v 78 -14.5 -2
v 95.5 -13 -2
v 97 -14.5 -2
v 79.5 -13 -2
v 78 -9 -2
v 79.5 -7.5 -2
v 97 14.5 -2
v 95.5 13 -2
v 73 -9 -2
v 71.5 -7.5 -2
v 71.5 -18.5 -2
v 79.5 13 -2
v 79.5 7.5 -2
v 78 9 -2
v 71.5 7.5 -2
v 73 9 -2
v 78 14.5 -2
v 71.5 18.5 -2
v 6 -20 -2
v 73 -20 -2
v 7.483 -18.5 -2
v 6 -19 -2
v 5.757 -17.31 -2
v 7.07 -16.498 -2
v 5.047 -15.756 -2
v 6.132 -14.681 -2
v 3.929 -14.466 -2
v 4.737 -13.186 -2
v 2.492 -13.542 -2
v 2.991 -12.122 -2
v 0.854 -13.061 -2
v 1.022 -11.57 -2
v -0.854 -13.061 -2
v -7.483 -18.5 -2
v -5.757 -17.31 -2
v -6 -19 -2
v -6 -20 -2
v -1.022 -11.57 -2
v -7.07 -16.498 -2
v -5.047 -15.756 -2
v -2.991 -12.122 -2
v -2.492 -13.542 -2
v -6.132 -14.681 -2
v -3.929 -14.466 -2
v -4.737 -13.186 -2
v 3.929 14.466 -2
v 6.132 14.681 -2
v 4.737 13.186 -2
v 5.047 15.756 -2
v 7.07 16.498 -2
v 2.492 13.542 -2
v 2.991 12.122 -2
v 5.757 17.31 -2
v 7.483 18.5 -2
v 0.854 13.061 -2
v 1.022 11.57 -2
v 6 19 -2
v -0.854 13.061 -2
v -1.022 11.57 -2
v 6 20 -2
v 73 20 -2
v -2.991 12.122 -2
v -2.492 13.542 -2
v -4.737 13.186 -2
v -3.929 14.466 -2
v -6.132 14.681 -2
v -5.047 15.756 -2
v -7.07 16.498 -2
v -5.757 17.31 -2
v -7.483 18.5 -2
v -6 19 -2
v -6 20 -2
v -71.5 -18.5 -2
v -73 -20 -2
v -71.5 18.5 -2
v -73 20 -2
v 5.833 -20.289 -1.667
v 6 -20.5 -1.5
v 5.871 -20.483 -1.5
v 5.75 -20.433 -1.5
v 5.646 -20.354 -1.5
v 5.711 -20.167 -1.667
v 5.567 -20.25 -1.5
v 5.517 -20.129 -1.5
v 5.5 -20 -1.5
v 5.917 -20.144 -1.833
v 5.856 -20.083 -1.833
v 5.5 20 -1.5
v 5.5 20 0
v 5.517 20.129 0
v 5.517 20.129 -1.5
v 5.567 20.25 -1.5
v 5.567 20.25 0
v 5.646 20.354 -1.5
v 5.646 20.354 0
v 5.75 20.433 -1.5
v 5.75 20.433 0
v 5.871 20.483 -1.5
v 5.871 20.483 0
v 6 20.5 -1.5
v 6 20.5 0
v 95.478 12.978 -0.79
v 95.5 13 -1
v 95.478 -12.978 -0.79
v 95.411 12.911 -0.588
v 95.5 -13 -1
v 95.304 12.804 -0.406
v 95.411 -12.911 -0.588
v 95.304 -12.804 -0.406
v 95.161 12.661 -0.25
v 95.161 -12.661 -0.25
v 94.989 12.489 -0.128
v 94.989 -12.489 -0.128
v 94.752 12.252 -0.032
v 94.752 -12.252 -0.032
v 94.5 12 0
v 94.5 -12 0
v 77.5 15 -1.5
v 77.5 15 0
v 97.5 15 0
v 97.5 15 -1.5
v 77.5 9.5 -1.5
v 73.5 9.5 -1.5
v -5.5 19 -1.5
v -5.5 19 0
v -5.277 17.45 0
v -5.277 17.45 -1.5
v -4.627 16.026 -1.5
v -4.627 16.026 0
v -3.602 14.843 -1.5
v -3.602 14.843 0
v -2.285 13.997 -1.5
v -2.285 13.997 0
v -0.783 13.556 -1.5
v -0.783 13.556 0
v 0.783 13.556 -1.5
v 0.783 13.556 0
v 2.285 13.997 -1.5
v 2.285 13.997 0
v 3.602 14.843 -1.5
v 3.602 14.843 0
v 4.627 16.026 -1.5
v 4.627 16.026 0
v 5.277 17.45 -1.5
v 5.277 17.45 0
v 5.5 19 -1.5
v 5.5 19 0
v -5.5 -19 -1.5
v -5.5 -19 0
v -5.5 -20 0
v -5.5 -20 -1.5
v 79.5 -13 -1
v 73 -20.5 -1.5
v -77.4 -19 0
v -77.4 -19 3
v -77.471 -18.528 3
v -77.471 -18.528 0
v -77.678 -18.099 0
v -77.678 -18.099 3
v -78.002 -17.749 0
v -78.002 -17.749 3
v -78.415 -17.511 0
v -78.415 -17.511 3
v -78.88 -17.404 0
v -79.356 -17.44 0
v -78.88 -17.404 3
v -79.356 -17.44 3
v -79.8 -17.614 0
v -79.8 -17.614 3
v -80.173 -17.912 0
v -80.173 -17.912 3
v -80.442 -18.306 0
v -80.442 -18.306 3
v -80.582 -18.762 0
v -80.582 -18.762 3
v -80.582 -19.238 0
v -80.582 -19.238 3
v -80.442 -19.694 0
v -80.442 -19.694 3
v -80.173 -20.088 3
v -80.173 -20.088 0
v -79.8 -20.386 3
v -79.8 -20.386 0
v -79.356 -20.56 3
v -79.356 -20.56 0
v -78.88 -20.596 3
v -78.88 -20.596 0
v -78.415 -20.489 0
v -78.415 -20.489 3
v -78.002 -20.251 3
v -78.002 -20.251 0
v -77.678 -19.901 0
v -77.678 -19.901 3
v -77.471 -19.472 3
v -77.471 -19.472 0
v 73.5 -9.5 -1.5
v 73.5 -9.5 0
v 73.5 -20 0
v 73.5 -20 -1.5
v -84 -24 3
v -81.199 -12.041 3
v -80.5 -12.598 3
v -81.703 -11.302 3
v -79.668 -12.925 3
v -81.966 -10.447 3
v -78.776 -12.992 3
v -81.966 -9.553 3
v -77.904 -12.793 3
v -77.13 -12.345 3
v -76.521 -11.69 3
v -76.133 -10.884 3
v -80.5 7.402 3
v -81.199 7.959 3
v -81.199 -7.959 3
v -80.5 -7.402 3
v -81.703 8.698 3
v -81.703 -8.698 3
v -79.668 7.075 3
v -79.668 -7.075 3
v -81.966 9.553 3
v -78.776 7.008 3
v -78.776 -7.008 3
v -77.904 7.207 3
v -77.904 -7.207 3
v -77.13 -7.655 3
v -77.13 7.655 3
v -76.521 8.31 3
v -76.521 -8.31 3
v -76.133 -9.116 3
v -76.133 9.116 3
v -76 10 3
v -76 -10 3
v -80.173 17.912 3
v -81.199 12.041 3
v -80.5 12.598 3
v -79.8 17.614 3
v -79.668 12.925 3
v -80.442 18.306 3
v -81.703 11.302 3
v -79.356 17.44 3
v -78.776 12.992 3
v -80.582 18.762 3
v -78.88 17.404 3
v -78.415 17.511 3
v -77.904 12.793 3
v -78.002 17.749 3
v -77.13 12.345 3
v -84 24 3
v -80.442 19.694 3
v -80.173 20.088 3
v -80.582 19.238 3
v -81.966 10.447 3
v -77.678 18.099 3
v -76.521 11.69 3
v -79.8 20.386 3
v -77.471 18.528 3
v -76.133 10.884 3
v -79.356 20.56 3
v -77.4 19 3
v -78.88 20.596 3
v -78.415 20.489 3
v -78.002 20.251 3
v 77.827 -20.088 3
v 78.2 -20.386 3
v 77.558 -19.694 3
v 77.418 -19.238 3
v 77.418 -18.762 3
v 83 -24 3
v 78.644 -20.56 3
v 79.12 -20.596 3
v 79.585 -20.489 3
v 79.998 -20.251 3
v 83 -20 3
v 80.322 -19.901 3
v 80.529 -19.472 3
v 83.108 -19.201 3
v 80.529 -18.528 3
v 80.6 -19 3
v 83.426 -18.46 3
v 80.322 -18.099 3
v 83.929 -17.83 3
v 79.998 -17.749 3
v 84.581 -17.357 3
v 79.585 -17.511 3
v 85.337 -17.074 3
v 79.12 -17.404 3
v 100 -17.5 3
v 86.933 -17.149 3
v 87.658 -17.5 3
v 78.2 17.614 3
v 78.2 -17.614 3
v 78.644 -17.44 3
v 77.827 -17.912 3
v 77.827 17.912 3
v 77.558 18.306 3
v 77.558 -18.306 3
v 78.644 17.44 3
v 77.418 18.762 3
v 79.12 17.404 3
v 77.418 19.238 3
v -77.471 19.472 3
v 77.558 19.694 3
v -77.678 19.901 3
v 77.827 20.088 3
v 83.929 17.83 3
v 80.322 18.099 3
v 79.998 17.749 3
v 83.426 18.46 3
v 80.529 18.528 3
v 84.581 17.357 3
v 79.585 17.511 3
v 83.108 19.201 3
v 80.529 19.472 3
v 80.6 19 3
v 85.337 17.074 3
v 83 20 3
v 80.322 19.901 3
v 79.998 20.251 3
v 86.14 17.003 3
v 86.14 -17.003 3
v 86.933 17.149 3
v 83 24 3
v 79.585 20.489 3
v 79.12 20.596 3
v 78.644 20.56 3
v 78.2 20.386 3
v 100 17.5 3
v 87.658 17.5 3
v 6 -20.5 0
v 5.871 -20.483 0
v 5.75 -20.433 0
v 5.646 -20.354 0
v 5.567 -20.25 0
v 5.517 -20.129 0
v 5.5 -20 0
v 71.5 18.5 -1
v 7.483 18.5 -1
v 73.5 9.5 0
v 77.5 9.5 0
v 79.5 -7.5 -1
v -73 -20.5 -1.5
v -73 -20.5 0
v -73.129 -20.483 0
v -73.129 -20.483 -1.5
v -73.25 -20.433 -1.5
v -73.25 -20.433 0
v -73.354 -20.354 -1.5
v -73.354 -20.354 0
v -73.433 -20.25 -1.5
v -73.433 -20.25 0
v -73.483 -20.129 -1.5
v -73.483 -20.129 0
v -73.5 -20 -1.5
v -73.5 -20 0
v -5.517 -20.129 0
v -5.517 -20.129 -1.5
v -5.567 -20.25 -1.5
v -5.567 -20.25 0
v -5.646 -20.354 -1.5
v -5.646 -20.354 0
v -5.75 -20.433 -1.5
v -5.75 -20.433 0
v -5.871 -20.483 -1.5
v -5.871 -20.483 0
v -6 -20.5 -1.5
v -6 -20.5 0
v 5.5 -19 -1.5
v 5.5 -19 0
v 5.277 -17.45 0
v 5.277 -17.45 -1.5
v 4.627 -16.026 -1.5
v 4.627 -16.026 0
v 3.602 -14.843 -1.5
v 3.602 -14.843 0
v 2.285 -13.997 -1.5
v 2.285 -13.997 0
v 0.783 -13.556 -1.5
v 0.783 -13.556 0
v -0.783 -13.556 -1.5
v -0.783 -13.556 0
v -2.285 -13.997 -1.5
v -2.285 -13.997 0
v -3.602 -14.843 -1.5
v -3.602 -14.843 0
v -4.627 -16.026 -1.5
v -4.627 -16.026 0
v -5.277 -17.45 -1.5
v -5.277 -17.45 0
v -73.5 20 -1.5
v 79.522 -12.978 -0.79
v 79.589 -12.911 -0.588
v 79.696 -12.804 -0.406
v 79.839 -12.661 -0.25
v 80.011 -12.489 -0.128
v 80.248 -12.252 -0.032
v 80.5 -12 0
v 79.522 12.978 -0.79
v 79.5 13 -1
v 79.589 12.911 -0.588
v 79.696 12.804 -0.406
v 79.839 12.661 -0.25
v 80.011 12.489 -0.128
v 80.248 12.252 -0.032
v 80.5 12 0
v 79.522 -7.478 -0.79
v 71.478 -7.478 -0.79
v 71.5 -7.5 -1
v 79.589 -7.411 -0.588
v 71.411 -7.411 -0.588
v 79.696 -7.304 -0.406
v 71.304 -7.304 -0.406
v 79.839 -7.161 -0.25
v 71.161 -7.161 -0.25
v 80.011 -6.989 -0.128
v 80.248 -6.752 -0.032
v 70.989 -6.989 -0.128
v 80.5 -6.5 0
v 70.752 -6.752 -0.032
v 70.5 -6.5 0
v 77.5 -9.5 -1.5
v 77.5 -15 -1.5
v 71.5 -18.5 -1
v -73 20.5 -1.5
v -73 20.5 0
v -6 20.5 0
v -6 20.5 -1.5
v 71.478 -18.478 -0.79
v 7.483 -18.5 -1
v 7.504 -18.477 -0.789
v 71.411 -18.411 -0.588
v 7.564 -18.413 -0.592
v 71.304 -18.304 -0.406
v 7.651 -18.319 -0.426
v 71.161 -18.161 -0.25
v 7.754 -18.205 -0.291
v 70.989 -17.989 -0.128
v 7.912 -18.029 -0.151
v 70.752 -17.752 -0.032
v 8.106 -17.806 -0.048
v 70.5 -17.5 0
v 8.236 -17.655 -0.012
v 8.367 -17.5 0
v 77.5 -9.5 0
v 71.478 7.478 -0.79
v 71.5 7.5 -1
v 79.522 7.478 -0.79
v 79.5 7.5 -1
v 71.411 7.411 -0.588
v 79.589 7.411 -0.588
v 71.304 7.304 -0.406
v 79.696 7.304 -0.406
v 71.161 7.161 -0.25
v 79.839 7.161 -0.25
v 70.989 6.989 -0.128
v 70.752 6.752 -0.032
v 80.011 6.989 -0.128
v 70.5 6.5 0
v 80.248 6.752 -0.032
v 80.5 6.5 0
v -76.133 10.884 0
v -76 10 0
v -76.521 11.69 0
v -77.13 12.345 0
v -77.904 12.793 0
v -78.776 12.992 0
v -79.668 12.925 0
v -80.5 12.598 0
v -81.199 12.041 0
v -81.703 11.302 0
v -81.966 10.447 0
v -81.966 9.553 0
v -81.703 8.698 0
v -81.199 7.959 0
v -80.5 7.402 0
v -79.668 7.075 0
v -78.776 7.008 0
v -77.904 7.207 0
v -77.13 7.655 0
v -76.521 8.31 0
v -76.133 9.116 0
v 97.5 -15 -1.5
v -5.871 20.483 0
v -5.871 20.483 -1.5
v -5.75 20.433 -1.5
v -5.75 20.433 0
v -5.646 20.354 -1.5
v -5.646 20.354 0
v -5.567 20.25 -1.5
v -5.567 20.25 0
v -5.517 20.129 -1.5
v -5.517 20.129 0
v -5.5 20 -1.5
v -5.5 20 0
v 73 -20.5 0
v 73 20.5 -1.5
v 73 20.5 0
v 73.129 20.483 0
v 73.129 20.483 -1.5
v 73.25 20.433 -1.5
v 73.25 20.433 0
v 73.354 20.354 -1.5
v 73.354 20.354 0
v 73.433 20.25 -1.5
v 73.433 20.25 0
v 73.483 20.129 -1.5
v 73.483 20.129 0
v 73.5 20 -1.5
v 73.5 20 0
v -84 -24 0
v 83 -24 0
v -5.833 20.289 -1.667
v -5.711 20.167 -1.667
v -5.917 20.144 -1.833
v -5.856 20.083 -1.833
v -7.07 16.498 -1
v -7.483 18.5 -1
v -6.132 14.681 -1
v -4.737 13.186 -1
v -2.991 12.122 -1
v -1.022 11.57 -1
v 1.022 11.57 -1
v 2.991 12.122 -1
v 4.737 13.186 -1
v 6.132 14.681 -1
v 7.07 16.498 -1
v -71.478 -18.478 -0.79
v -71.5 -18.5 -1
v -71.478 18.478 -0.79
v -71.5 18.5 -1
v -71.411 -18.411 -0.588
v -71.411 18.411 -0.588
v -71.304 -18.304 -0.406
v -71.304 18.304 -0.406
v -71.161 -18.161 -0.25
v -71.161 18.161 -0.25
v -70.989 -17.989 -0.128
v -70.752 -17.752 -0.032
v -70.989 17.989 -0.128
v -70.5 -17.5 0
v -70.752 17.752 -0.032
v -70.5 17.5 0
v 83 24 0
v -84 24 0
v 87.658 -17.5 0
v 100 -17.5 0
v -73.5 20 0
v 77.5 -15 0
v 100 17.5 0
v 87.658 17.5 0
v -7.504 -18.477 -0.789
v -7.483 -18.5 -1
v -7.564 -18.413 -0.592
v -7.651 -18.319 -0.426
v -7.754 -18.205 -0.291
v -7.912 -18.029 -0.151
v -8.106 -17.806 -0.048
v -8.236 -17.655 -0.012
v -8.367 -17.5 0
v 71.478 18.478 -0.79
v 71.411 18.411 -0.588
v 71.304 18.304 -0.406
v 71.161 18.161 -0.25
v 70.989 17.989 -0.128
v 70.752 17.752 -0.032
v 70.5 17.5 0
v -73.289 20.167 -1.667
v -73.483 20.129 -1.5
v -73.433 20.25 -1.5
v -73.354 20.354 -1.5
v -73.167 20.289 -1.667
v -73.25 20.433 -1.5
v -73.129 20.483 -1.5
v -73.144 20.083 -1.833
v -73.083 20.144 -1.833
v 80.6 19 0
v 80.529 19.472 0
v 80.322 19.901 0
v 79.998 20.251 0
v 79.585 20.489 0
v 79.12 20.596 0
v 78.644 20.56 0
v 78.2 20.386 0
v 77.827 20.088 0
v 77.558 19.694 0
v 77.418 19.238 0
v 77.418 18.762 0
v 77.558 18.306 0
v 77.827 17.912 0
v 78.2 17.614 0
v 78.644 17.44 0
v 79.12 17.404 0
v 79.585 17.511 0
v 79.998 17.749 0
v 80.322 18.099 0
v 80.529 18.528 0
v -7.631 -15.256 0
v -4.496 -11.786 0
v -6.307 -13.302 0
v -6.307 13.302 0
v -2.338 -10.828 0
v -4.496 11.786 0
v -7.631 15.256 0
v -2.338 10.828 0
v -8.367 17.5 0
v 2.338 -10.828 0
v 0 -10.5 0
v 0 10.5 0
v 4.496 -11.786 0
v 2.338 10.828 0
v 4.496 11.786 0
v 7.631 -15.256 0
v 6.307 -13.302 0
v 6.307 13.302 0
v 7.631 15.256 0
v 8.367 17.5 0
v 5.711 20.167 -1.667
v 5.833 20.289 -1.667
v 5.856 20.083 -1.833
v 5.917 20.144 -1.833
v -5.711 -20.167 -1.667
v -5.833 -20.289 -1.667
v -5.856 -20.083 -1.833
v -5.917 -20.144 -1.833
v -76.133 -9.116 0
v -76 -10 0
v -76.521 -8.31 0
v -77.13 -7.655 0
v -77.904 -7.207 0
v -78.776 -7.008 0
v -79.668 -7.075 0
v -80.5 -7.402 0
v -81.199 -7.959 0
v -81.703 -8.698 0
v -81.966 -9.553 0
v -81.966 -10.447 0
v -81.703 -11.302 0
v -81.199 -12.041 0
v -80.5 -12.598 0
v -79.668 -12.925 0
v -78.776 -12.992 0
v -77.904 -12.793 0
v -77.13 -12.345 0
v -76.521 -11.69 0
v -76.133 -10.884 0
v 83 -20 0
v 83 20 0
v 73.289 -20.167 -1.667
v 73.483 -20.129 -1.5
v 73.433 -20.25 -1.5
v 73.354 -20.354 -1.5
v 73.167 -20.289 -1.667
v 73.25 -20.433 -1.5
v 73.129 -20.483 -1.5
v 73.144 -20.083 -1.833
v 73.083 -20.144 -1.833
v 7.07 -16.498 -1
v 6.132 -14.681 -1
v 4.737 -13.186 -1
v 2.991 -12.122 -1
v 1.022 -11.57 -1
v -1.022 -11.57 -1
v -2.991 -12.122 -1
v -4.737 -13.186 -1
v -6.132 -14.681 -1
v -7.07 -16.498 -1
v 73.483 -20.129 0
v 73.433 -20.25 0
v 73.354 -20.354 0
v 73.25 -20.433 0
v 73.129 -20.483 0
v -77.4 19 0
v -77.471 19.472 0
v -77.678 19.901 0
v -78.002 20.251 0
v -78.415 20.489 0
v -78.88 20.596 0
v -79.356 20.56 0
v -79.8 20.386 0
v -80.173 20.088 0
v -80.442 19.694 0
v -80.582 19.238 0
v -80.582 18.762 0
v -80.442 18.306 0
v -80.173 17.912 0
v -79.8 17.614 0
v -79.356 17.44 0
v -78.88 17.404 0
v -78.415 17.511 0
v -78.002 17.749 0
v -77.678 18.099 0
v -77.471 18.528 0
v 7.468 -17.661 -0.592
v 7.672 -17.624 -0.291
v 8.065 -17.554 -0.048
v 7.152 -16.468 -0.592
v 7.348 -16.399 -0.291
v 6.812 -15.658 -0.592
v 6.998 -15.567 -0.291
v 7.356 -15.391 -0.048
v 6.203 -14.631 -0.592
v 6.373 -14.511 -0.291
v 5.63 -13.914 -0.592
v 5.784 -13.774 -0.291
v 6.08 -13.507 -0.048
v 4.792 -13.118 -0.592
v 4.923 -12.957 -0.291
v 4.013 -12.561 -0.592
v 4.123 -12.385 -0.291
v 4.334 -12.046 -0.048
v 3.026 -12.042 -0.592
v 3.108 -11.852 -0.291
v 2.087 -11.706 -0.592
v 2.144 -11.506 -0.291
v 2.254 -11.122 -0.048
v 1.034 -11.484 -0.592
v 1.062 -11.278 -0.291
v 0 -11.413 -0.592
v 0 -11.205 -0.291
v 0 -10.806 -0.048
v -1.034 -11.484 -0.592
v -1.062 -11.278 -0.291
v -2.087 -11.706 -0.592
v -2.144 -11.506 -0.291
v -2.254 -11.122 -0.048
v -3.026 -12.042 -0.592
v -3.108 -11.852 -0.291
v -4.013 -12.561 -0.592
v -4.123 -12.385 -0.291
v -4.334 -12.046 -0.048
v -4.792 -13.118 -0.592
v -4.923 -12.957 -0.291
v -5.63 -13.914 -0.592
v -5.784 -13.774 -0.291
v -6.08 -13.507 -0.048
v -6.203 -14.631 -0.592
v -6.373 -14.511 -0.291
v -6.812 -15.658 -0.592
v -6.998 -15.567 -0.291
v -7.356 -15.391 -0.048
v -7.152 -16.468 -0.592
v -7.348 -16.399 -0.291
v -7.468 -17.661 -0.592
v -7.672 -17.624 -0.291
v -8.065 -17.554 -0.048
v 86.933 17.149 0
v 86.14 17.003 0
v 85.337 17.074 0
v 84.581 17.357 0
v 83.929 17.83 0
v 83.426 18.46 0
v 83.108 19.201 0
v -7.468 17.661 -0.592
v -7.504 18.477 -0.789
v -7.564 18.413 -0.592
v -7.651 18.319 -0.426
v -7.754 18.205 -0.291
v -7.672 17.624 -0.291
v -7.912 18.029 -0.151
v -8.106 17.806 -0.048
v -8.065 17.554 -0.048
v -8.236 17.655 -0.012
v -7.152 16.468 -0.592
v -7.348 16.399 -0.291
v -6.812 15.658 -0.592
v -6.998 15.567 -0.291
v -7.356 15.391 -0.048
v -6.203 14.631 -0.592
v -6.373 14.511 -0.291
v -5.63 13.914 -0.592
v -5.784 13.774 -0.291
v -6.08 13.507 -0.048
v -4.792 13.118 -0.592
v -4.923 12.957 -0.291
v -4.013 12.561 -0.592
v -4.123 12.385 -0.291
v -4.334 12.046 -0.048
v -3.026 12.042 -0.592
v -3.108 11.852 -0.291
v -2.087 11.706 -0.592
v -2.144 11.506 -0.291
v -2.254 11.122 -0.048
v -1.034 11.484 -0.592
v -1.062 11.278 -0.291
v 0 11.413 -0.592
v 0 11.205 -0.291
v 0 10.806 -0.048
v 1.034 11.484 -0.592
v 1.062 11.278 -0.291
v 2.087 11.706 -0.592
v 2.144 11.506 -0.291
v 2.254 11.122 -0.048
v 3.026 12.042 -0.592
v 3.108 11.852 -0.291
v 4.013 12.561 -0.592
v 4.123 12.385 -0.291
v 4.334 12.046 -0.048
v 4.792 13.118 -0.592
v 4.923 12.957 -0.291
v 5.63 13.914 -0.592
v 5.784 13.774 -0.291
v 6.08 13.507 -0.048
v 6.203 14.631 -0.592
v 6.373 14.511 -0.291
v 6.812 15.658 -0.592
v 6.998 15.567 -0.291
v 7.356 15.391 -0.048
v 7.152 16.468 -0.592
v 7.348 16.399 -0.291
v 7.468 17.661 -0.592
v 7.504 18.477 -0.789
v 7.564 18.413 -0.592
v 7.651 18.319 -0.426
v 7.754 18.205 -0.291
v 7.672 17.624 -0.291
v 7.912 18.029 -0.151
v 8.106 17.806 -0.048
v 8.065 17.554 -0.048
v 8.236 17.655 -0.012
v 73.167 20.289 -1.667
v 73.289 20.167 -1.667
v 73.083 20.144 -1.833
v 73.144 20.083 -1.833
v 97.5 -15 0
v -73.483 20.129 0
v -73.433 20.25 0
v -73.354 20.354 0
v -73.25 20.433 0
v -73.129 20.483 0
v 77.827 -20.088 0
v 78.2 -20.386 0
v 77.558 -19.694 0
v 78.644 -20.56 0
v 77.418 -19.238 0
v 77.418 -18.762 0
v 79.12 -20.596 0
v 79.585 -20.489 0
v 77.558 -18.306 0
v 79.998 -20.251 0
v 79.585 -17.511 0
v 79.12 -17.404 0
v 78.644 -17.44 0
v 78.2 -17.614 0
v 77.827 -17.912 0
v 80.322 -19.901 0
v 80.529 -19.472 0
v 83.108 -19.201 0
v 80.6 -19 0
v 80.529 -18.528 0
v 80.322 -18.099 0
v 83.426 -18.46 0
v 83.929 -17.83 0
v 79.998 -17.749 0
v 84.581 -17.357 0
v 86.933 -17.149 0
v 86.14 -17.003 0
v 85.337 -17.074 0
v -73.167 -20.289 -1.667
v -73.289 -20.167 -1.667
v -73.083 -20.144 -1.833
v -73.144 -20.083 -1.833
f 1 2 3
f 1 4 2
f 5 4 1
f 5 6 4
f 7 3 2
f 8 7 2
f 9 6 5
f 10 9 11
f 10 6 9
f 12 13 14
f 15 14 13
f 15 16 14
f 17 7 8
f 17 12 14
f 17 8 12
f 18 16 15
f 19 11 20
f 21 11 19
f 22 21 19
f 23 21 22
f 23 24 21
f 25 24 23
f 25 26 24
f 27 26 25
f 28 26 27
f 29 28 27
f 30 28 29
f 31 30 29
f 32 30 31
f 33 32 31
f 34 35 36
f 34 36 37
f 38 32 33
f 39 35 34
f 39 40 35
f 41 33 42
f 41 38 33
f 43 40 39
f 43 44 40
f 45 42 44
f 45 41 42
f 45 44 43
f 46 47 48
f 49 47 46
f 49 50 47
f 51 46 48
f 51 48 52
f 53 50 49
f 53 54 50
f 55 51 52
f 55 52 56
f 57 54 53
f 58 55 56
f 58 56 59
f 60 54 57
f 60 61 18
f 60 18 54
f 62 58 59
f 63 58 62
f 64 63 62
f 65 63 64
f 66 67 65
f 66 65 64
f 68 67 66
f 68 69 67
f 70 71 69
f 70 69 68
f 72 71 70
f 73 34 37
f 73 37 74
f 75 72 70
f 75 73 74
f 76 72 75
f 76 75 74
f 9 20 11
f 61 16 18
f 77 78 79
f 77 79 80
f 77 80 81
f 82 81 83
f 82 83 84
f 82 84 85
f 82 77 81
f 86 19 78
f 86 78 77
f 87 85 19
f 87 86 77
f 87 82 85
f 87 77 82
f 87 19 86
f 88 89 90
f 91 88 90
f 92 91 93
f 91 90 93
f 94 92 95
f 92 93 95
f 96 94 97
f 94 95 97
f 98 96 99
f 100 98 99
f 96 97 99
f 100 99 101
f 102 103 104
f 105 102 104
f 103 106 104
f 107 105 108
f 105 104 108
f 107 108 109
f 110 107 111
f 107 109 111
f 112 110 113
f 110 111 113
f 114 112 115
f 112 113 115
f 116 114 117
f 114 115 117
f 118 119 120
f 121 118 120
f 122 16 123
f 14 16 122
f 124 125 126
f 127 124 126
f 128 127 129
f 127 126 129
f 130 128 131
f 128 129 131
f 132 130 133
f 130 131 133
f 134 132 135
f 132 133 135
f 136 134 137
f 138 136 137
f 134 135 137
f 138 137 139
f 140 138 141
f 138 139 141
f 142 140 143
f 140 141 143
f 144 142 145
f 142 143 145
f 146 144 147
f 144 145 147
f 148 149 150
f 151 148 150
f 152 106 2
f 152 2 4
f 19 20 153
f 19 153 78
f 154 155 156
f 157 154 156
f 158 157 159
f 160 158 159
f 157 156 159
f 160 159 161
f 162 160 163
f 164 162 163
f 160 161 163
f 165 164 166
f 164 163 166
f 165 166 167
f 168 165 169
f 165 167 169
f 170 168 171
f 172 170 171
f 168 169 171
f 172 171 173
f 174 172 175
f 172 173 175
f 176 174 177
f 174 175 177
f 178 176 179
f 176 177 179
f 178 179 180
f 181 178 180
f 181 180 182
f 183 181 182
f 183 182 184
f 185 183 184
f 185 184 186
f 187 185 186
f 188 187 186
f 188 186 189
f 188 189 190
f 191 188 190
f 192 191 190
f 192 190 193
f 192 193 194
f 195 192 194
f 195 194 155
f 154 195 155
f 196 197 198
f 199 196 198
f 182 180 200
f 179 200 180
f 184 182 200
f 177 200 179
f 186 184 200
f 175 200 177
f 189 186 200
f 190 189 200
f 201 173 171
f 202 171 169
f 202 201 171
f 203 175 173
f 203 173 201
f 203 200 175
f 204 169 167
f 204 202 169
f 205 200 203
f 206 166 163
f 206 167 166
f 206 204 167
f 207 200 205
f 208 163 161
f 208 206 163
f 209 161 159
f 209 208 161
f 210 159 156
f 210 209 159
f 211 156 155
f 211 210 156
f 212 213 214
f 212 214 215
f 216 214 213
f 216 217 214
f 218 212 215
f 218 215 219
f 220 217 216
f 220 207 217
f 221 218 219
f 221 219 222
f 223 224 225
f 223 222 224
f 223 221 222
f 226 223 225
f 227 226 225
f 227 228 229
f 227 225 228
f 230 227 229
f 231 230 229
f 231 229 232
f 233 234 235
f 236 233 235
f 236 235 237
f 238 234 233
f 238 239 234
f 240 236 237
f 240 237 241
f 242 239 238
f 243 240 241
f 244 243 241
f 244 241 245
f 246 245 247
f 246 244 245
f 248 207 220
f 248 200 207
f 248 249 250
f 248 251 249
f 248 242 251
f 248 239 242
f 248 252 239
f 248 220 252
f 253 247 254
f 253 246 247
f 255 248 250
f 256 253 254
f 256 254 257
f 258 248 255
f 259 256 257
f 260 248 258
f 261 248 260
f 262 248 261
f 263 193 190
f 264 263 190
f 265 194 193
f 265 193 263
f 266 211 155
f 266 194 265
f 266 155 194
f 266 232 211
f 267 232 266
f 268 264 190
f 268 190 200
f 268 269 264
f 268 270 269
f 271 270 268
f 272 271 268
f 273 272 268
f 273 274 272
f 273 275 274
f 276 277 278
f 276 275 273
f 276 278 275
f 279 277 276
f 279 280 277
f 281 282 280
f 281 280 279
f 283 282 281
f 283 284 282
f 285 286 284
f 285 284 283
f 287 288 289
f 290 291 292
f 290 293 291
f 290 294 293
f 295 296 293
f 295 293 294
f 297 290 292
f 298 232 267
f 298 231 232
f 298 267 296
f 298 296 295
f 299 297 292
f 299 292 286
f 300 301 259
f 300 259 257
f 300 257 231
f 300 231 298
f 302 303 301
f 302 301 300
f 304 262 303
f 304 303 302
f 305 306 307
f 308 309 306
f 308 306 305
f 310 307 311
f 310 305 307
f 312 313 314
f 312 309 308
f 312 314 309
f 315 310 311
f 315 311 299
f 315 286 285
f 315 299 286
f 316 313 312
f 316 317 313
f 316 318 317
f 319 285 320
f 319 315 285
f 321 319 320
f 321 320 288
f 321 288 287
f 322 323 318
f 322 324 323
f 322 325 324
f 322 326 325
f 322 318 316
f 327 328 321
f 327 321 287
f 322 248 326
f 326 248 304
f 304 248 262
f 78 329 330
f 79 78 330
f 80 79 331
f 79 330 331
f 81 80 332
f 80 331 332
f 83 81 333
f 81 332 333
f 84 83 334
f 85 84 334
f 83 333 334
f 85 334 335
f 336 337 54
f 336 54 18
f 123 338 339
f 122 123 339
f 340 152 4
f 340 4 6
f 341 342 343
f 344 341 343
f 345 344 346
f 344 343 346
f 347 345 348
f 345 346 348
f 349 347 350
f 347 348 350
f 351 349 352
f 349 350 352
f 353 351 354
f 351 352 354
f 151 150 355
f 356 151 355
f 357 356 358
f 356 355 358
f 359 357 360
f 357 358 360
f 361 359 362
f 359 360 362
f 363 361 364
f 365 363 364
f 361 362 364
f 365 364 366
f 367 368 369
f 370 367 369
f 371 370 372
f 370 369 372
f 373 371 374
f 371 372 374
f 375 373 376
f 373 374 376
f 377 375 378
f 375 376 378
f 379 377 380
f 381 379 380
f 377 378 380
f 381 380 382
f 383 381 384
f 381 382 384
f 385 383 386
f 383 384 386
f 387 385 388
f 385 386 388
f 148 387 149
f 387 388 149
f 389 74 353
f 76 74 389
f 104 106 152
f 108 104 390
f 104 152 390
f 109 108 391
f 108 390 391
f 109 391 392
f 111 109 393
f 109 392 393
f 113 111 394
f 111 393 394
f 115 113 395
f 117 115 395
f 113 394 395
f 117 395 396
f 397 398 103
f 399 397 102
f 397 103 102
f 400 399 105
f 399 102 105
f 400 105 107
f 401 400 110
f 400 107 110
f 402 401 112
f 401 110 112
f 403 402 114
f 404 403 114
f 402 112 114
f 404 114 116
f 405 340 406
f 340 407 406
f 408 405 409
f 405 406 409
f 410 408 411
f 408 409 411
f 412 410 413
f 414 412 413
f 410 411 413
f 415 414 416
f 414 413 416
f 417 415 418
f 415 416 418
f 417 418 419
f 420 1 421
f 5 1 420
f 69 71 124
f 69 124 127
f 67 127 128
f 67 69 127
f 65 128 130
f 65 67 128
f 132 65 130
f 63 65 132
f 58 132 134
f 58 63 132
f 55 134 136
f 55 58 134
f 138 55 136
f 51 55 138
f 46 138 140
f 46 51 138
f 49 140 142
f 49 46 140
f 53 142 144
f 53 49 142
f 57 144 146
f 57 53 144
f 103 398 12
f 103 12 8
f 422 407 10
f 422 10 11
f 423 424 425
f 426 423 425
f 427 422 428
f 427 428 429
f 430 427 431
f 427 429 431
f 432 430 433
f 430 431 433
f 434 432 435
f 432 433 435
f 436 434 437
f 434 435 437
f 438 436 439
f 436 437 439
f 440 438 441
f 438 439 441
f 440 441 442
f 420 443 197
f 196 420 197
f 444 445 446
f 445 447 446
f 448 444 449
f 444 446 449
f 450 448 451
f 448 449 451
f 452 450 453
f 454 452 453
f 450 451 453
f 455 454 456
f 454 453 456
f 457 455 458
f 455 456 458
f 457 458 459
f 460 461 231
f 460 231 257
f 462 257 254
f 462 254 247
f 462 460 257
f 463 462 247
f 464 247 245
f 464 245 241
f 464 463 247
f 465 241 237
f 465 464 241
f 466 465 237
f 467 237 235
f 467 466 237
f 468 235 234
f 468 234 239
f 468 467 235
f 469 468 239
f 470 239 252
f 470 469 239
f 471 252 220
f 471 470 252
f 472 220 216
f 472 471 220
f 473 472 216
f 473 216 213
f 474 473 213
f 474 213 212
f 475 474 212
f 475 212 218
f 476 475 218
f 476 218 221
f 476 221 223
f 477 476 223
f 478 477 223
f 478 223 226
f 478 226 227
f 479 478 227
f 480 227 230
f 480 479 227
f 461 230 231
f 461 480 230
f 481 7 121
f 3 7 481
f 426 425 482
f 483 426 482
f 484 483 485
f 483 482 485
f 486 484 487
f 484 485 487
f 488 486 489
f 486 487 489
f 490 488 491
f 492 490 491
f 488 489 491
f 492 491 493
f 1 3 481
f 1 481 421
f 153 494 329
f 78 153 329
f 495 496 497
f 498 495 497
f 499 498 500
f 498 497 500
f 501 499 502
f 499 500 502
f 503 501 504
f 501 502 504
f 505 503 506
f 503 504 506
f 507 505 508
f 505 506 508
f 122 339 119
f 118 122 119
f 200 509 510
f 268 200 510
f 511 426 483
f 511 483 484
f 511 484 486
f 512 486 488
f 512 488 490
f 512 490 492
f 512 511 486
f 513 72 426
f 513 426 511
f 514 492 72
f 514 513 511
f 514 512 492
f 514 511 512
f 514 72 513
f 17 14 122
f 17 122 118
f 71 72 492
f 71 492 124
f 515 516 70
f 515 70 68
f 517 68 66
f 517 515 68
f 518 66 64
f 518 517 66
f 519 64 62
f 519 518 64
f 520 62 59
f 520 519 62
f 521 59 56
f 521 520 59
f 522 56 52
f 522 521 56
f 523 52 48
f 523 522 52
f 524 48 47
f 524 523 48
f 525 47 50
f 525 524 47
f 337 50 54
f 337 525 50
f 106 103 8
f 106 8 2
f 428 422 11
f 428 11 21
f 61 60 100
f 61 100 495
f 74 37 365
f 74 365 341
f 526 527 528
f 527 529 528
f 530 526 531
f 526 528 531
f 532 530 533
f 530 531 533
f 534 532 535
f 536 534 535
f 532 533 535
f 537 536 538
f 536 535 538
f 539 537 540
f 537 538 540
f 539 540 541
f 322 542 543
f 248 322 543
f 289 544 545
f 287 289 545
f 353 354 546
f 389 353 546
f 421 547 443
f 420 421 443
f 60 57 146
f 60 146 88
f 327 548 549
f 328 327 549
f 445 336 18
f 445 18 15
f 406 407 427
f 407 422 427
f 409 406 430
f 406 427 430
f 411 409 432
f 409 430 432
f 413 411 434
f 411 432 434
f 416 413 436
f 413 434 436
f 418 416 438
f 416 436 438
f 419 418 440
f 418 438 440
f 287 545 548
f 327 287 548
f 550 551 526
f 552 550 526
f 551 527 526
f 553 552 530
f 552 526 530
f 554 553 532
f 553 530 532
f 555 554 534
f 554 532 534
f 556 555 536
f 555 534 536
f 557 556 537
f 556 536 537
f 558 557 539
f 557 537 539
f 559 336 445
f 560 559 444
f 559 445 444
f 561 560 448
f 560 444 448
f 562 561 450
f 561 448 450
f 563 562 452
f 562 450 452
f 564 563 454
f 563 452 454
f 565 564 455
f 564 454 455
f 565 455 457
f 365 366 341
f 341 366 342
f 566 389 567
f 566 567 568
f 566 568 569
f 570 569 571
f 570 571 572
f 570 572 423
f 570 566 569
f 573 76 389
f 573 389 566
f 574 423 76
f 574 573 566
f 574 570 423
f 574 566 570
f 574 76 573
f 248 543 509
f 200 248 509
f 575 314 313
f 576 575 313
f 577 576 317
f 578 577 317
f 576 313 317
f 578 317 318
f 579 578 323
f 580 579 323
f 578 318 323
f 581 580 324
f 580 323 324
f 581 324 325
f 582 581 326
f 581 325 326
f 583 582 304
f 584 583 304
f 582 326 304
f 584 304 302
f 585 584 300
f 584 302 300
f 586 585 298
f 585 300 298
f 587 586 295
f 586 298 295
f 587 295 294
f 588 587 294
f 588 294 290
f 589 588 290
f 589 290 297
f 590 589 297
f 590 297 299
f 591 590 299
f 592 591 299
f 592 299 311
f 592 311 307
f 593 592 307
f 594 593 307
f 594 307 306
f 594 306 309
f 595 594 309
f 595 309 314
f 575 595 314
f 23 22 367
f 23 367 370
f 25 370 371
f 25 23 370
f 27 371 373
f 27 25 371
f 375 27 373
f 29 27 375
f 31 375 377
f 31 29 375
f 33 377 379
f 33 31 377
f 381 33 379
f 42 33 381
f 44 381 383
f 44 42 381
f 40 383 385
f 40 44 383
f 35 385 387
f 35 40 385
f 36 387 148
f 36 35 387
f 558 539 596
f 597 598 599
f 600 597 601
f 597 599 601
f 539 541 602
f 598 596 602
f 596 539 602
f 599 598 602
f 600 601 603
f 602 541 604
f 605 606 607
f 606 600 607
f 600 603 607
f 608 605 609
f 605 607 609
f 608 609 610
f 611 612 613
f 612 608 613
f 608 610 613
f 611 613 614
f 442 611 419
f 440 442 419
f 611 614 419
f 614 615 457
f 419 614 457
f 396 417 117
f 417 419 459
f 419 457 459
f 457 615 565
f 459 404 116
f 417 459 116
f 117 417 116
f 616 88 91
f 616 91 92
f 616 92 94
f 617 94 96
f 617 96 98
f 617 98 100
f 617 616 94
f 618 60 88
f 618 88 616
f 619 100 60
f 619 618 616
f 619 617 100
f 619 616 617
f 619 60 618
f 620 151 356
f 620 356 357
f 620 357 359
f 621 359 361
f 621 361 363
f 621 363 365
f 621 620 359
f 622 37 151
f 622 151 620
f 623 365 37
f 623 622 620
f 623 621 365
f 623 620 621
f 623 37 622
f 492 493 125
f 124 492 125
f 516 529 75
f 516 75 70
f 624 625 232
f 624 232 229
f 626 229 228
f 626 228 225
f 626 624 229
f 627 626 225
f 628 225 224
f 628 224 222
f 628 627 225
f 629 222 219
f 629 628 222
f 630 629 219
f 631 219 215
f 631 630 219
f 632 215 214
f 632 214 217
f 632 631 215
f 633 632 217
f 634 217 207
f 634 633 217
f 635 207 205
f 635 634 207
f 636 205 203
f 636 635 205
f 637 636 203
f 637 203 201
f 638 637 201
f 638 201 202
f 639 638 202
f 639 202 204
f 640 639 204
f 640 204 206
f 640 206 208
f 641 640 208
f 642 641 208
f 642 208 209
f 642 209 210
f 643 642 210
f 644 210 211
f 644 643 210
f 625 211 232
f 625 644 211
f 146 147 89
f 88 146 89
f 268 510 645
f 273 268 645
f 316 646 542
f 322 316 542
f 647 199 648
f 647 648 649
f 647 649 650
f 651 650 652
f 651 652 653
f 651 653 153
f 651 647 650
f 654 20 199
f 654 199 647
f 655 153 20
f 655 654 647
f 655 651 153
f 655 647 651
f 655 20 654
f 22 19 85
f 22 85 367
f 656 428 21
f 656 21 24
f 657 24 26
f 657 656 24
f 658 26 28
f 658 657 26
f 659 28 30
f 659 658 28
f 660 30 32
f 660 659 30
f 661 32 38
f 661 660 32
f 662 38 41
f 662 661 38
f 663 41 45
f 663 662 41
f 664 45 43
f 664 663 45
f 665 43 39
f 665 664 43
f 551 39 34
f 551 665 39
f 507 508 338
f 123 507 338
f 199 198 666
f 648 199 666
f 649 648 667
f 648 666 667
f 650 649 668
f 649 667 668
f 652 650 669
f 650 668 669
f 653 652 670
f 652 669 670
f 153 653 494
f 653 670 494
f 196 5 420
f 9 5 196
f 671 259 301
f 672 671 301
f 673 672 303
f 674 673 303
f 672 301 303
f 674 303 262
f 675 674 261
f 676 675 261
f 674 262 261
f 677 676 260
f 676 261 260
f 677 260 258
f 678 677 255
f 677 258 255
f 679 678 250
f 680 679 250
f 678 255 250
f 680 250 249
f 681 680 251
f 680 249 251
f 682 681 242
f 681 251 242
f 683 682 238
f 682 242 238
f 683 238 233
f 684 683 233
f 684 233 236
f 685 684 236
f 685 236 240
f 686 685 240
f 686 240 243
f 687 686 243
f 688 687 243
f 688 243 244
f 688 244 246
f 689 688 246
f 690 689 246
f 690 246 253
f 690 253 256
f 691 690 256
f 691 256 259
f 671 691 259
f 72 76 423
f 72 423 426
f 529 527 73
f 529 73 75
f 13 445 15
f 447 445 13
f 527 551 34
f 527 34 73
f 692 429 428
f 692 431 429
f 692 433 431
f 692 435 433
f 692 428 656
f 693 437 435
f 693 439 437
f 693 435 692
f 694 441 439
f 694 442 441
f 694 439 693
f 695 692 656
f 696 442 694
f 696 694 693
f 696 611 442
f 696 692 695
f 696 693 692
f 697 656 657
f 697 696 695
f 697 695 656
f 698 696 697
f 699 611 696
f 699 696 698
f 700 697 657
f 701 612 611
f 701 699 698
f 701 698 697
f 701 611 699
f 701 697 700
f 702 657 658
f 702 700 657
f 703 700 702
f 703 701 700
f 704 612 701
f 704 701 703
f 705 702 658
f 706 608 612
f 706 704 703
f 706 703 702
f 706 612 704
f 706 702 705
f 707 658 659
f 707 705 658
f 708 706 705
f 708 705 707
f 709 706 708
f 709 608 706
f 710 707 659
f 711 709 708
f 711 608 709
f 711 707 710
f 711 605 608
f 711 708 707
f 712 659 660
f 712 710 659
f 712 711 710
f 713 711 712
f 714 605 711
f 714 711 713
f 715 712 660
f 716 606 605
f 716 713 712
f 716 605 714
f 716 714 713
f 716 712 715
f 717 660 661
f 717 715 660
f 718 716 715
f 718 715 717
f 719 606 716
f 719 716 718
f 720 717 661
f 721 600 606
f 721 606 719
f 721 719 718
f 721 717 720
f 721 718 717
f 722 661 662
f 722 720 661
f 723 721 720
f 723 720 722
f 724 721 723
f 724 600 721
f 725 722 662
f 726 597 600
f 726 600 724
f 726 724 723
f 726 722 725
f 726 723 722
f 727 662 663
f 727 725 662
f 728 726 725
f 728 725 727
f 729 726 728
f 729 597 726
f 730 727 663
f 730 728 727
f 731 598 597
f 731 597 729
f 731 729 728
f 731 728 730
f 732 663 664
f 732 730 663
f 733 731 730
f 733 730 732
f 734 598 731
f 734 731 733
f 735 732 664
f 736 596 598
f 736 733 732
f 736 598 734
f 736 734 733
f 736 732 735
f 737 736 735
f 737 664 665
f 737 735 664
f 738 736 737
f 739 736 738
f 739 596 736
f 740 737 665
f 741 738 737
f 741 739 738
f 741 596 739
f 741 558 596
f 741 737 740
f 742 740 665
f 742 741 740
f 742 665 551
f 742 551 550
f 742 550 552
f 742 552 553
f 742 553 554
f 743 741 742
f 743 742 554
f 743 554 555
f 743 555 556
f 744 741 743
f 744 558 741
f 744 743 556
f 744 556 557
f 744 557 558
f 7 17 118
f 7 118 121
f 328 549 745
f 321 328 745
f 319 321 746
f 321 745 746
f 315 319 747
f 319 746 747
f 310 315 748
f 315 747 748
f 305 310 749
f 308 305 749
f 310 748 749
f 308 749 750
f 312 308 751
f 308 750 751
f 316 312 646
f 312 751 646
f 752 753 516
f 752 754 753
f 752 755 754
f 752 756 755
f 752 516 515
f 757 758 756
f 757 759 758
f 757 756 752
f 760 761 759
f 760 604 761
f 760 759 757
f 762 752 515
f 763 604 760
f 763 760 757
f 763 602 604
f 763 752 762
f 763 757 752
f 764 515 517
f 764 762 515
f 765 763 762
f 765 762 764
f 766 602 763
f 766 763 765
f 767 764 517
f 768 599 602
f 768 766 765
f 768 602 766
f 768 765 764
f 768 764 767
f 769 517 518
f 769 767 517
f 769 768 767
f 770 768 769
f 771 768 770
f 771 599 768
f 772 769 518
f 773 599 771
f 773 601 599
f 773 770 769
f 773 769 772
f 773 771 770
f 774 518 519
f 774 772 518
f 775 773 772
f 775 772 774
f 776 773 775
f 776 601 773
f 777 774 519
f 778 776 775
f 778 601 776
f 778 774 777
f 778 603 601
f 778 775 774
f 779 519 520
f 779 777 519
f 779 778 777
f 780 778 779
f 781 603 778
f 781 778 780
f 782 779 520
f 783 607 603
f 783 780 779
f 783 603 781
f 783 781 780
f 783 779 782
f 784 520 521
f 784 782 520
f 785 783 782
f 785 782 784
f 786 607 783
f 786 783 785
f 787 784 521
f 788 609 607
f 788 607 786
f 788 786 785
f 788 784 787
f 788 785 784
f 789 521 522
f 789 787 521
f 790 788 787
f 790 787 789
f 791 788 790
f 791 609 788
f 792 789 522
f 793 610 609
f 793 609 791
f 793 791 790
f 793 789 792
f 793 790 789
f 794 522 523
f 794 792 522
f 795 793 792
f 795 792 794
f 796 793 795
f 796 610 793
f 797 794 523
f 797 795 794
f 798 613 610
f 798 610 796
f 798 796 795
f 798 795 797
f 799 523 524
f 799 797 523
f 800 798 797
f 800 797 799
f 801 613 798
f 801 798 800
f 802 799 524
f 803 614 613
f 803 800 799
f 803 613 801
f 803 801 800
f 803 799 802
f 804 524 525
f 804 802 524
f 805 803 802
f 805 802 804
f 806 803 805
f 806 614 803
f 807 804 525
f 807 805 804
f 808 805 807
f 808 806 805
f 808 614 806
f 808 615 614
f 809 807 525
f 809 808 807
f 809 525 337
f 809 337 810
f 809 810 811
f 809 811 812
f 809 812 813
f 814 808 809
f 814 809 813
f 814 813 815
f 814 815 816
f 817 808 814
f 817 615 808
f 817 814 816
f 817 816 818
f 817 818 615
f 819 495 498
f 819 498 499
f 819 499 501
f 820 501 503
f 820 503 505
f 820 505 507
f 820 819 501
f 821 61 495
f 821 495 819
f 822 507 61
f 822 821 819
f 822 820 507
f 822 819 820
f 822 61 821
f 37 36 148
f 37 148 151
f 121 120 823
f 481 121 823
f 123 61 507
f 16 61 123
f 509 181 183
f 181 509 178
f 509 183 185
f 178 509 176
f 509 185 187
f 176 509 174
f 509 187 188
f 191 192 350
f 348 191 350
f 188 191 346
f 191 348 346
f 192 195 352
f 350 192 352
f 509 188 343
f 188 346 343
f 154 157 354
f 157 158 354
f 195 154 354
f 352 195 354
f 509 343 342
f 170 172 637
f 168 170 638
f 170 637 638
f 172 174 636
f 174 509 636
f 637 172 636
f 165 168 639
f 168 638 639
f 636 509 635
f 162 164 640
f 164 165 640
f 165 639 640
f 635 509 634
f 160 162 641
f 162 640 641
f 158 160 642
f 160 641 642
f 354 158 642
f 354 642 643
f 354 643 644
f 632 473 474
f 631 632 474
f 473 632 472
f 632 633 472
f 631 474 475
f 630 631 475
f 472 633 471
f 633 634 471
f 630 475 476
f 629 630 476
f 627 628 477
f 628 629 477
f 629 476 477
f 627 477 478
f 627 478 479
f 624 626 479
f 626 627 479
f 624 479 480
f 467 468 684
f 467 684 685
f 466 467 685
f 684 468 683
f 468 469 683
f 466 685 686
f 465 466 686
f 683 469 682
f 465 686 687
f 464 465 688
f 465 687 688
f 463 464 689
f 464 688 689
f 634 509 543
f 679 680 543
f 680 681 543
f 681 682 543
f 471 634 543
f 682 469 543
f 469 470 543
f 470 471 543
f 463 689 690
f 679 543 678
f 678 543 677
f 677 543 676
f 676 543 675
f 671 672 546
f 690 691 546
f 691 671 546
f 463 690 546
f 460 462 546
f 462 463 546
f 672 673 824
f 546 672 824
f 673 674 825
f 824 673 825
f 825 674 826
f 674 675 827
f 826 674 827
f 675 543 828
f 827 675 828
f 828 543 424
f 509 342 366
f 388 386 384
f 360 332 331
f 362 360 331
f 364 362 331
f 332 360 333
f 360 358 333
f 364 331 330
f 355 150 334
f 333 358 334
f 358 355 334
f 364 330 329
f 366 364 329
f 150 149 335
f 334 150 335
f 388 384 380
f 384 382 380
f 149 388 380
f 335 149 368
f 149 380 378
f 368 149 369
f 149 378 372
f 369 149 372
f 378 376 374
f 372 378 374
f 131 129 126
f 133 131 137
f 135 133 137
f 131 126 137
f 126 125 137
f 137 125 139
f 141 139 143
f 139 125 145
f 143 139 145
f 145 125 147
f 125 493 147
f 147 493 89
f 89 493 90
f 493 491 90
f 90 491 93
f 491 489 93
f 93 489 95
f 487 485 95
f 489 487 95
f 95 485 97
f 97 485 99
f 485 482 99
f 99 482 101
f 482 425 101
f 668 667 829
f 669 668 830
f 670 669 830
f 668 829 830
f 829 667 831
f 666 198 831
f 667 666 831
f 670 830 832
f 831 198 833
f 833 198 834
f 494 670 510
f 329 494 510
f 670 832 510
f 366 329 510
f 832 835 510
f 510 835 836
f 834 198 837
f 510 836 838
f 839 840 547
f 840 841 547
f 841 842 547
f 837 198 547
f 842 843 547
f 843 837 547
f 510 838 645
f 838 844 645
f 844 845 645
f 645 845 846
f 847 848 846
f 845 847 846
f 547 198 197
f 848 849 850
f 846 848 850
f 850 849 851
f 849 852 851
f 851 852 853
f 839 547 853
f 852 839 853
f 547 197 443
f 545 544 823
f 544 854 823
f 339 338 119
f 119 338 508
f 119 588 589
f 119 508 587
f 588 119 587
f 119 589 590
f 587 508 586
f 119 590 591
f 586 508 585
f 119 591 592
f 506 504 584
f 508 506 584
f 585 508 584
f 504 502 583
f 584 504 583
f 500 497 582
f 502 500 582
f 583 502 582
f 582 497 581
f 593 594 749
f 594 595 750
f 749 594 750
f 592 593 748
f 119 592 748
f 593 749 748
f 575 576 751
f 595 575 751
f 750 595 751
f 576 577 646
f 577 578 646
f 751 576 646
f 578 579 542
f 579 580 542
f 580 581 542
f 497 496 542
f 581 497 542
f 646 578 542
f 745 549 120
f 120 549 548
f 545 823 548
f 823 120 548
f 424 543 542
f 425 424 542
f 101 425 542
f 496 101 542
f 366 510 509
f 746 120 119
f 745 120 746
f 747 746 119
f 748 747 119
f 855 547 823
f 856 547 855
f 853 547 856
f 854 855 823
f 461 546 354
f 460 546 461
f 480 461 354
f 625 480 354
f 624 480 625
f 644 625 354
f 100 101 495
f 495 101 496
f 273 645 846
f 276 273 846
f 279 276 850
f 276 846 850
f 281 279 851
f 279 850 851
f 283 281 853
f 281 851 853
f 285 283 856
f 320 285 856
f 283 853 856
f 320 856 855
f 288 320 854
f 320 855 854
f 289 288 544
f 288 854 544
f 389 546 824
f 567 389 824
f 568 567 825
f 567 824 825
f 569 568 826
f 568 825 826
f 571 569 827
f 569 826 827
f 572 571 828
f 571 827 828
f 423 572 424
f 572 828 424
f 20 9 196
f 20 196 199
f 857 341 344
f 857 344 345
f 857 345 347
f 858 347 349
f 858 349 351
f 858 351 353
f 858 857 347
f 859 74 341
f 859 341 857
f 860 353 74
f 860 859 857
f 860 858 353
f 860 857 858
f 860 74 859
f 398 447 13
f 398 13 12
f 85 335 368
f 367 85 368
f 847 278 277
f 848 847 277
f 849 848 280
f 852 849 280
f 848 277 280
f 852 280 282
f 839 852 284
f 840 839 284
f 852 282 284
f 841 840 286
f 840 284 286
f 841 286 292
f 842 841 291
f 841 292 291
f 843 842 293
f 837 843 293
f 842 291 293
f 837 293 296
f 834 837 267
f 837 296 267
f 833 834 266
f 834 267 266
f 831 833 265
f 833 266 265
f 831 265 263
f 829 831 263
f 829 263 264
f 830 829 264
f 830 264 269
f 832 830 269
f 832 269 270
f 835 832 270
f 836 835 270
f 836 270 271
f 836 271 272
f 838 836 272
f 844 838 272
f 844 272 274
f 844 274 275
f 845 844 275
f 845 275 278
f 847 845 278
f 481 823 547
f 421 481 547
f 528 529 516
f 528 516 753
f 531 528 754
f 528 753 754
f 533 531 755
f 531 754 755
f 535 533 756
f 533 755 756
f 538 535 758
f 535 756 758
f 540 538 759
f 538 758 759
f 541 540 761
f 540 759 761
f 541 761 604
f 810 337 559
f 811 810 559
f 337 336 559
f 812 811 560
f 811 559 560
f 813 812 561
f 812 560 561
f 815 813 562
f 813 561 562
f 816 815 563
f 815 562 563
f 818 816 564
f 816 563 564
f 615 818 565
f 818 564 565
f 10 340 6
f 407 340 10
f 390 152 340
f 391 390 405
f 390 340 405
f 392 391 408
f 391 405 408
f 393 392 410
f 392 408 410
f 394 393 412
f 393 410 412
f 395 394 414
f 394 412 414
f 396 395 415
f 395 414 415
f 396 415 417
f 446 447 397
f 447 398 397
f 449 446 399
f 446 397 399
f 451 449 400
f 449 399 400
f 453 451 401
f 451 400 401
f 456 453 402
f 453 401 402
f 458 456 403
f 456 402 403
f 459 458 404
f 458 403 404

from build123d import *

# Parameters (mm, degrees)
SKETCH1_R           = 3
BOSS_EXTRUDE1_DEPTH = 3
BOSS_EXTRUDE2_DEPTH = 2
CHAMFER1_SIZE       = 0.5
FILLET1_R           = 1
SKETCH3_R           = 1.6
CUT_EXTRUDE1_DEPTH  = 103.961157725


with BuildPart() as part:
    # Sketch1 → Boss-Extrude1 (new body)
    with BuildSketch(Plane.XY):
        with BuildLine():
            Line((87.658312395, -17.5), (100, -17.5))
            Line((100, -17.5), (100, 17.5))
            Line((100, 17.5), (87.658312395, 17.5))
            ThreePointArc((87.658312395, 17.5), (84.581362835, 17.356617963), (83, 20))
            Line((83, 20), (83, 24))
            Line((83, 24), (-84, 24))
            Line((-84, 24), (-84, -24))
            Line((-84, -24), (83, -24))
            Line((83, -24), (83, -20))
            ThreePointArc((83, -20), (84.581362835, -17.356617963), (87.658312395, -17.5))
        make_face()
        with Locations((-79, -10)):
            Circle(SKETCH1_R, mode=Mode.SUBTRACT)
        with Locations((-79, 10)):
            Circle(SKETCH1_R, mode=Mode.SUBTRACT)
    extrude(amount=BOSS_EXTRUDE1_DEPTH)

    # Sketch2 → Boss-Extrude2 (add)
    with BuildSketch(Plane(origin=(0, 0, 0), x_dir=(-1, 0, 0), z_dir=(0, 0, -1))):
        with BuildLine():
            Line((-73.5, 20), (-73.5, 9.5))
            Line((-73.5, 9.5), (-77.5, 9.5))
            Line((-77.5, 9.5), (-77.5, 15))
            Line((-77.5, 15), (-97.5, 15))
            Line((-97.5, 15), (-97.5, -15))
            Line((-97.5, -15), (-77.5, -15))
            Line((-77.5, -15), (-77.5, -9.5))
            Line((-77.5, -9.5), (-73.5, -9.5))
            Line((-73.5, -9.5), (-73.5, -20))
            ThreePointArc((-73.5, -20), (-73.353553391, -20.353553391), (-73, -20.5))
            Line((-73, -20.5), (-6, -20.5))
            ThreePointArc((-6, -20.5), (-5.646446609, -20.353553391), (-5.5, -20))
            Line((-5.5, -20), (-5.5, -19))
            ThreePointArc((-5.5, -19), (0, -13.5), (5.5, -19))
            Line((5.5, -19), (5.5, -20))
            ThreePointArc((5.5, -20), (5.646446609, -20.353553391), (6, -20.5))
            Line((6, -20.5), (73, -20.5))
            ThreePointArc((73, -20.5), (73.353553391, -20.353553391), (73.5, -20))
            Line((73.5, -20), (73.5, 20))
            ThreePointArc((73.5, 20), (73.353553391, 20.353553391), (73, 20.5))
            Line((73, 20.5), (6, 20.5))
            ThreePointArc((6, 20.5), (5.646446609, 20.353553391), (5.5, 20))
            Line((5.5, 20), (5.5, 19))
            ThreePointArc((5.5, 19), (0, 13.5), (-5.5, 19))
            Line((-5.5, 19), (-5.5, 20))
            ThreePointArc((-5.5, 20), (-5.646446609, 20.353553391), (-6, 20.5))
            Line((-6, 20.5), (-73, 20.5))
            ThreePointArc((-73, 20.5), (-73.353553391, 20.353553391), (-73.5, 20))
        make_face()
        with BuildLine():
            Line((-7.483314774, 18.5), (-71.5, 18.5))
            Line((-71.5, 18.5), (-71.5, 7.5))
            Line((-71.5, 7.5), (-79.5, 7.5))
            Line((-79.5, 7.5), (-79.5, 13))
            Line((-79.5, 13), (-95.5, 13))
            Line((-95.5, 13), (-95.5, -13))
            Line((-95.5, -13), (-79.5, -13))
            Line((-79.5, -13), (-79.5, -7.5))
            Line((-79.5, -7.5), (-71.5, -7.5))
            Line((-71.5, -7.5), (-71.5, -18.5))
            Line((-71.5, -18.5), (-7.483314774, -18.5))
            ThreePointArc((-7.483314774, -18.5), (0, -11.5), (7.483314774, -18.5))
            Line((7.483314774, -18.5), (71.5, -18.5))
            Line((71.5, -18.5), (71.5, 18.5))
            Line((71.5, 18.5), (7.483314774, 18.5))
            ThreePointArc((7.483314774, 18.5), (0, 11.5), (-7.483314774, 18.5))
        make_face(mode=Mode.SUBTRACT)
    extrude(amount=BOSS_EXTRUDE2_DEPTH)

    # Chamfer1
    chamfer1_edges = [part.edges().sort_by_distance(p)[0] for p in [
        (73.353553391, 20.353553391, -2),
        (73.5, 14.75, -2),
        (75.5, 9.5, -2),
        (77.5, 12.25, -2),
        (87.5, 15, -2),
        (97.5, 0, -2),
        (87.5, -15, -2),
        (77.5, -12.25, -2),
        (75.5, -9.5, -2),
        (73.5, -14.75, -2),
        (73.353553391, -20.353553391, -2),
        (39.5, -20.5, -2),
        (5.646446609, -20.353553391, -2),
        (5.5, -19.5, -2),
        (0, -13.5, -2),
        (-5.5, -19.5, -2),
        (-5.646446609, -20.353553391, -2),
        (-39.5, -20.5, -2),
        (-73.353553391, -20.353553391, -2),
        (-73.5, 0, -2),
        (-73.353553391, 20.353553391, -2),
        (-39.5, 20.5, -2),
        (-5.646446609, 20.353553391, -2),
        (-5.5, 19.5, -2),
        (0, 13.5, -2),
        (5.5, 19.5, -2),
        (5.646446609, 20.353553391, -2),
        (39.5, 20.5, -2),
    ]]
    chamfer(chamfer1_edges, length=CHAMFER1_SIZE - 0.0001)  # a hair under: the kernel refuses the full size

    # Fillet1
    fillet1_edges = [part.edges().sort_by_distance(p)[0] for p in [
        (0, 11.5, 0),
        (39.491657387, 18.5, 0),
        (71.5, 13, 0),
        (75.5, 7.5, 0),
        (79.5, 10.25, 0),
        (87.5, 13, 0),
        (95.5, 0, 0),
        (87.5, -13, 0),
        (79.5, -10.25, 0),
        (75.5, -7.5, 0),
        (71.5, -13, 0),
        (39.491657387, -18.5, 0),
        (0, -11.5, 0),
        (-39.491657387, -18.5, 0),
        (-71.5, 0, 0),
        (-39.491657387, 18.5, 0),
    ]]
    fillet(fillet1_edges, radius=FILLET1_R)

    # Sketch3 → Cut-Extrude1 (cut, through all)
    with BuildSketch(Plane.XY.offset(3)):
        with Locations((-79, 19)):
            Circle(SKETCH3_R)
        with Locations((-79, -19)):
            Circle(SKETCH3_R)
        with Locations((79, 19)):
            Circle(SKETCH3_R)
        with Locations((79, -19)):
            Circle(SKETCH3_R)
    extrude(amount=-CUT_EXTRUDE1_DEPTH, mode=Mode.SUBTRACT)


solid = part.part
